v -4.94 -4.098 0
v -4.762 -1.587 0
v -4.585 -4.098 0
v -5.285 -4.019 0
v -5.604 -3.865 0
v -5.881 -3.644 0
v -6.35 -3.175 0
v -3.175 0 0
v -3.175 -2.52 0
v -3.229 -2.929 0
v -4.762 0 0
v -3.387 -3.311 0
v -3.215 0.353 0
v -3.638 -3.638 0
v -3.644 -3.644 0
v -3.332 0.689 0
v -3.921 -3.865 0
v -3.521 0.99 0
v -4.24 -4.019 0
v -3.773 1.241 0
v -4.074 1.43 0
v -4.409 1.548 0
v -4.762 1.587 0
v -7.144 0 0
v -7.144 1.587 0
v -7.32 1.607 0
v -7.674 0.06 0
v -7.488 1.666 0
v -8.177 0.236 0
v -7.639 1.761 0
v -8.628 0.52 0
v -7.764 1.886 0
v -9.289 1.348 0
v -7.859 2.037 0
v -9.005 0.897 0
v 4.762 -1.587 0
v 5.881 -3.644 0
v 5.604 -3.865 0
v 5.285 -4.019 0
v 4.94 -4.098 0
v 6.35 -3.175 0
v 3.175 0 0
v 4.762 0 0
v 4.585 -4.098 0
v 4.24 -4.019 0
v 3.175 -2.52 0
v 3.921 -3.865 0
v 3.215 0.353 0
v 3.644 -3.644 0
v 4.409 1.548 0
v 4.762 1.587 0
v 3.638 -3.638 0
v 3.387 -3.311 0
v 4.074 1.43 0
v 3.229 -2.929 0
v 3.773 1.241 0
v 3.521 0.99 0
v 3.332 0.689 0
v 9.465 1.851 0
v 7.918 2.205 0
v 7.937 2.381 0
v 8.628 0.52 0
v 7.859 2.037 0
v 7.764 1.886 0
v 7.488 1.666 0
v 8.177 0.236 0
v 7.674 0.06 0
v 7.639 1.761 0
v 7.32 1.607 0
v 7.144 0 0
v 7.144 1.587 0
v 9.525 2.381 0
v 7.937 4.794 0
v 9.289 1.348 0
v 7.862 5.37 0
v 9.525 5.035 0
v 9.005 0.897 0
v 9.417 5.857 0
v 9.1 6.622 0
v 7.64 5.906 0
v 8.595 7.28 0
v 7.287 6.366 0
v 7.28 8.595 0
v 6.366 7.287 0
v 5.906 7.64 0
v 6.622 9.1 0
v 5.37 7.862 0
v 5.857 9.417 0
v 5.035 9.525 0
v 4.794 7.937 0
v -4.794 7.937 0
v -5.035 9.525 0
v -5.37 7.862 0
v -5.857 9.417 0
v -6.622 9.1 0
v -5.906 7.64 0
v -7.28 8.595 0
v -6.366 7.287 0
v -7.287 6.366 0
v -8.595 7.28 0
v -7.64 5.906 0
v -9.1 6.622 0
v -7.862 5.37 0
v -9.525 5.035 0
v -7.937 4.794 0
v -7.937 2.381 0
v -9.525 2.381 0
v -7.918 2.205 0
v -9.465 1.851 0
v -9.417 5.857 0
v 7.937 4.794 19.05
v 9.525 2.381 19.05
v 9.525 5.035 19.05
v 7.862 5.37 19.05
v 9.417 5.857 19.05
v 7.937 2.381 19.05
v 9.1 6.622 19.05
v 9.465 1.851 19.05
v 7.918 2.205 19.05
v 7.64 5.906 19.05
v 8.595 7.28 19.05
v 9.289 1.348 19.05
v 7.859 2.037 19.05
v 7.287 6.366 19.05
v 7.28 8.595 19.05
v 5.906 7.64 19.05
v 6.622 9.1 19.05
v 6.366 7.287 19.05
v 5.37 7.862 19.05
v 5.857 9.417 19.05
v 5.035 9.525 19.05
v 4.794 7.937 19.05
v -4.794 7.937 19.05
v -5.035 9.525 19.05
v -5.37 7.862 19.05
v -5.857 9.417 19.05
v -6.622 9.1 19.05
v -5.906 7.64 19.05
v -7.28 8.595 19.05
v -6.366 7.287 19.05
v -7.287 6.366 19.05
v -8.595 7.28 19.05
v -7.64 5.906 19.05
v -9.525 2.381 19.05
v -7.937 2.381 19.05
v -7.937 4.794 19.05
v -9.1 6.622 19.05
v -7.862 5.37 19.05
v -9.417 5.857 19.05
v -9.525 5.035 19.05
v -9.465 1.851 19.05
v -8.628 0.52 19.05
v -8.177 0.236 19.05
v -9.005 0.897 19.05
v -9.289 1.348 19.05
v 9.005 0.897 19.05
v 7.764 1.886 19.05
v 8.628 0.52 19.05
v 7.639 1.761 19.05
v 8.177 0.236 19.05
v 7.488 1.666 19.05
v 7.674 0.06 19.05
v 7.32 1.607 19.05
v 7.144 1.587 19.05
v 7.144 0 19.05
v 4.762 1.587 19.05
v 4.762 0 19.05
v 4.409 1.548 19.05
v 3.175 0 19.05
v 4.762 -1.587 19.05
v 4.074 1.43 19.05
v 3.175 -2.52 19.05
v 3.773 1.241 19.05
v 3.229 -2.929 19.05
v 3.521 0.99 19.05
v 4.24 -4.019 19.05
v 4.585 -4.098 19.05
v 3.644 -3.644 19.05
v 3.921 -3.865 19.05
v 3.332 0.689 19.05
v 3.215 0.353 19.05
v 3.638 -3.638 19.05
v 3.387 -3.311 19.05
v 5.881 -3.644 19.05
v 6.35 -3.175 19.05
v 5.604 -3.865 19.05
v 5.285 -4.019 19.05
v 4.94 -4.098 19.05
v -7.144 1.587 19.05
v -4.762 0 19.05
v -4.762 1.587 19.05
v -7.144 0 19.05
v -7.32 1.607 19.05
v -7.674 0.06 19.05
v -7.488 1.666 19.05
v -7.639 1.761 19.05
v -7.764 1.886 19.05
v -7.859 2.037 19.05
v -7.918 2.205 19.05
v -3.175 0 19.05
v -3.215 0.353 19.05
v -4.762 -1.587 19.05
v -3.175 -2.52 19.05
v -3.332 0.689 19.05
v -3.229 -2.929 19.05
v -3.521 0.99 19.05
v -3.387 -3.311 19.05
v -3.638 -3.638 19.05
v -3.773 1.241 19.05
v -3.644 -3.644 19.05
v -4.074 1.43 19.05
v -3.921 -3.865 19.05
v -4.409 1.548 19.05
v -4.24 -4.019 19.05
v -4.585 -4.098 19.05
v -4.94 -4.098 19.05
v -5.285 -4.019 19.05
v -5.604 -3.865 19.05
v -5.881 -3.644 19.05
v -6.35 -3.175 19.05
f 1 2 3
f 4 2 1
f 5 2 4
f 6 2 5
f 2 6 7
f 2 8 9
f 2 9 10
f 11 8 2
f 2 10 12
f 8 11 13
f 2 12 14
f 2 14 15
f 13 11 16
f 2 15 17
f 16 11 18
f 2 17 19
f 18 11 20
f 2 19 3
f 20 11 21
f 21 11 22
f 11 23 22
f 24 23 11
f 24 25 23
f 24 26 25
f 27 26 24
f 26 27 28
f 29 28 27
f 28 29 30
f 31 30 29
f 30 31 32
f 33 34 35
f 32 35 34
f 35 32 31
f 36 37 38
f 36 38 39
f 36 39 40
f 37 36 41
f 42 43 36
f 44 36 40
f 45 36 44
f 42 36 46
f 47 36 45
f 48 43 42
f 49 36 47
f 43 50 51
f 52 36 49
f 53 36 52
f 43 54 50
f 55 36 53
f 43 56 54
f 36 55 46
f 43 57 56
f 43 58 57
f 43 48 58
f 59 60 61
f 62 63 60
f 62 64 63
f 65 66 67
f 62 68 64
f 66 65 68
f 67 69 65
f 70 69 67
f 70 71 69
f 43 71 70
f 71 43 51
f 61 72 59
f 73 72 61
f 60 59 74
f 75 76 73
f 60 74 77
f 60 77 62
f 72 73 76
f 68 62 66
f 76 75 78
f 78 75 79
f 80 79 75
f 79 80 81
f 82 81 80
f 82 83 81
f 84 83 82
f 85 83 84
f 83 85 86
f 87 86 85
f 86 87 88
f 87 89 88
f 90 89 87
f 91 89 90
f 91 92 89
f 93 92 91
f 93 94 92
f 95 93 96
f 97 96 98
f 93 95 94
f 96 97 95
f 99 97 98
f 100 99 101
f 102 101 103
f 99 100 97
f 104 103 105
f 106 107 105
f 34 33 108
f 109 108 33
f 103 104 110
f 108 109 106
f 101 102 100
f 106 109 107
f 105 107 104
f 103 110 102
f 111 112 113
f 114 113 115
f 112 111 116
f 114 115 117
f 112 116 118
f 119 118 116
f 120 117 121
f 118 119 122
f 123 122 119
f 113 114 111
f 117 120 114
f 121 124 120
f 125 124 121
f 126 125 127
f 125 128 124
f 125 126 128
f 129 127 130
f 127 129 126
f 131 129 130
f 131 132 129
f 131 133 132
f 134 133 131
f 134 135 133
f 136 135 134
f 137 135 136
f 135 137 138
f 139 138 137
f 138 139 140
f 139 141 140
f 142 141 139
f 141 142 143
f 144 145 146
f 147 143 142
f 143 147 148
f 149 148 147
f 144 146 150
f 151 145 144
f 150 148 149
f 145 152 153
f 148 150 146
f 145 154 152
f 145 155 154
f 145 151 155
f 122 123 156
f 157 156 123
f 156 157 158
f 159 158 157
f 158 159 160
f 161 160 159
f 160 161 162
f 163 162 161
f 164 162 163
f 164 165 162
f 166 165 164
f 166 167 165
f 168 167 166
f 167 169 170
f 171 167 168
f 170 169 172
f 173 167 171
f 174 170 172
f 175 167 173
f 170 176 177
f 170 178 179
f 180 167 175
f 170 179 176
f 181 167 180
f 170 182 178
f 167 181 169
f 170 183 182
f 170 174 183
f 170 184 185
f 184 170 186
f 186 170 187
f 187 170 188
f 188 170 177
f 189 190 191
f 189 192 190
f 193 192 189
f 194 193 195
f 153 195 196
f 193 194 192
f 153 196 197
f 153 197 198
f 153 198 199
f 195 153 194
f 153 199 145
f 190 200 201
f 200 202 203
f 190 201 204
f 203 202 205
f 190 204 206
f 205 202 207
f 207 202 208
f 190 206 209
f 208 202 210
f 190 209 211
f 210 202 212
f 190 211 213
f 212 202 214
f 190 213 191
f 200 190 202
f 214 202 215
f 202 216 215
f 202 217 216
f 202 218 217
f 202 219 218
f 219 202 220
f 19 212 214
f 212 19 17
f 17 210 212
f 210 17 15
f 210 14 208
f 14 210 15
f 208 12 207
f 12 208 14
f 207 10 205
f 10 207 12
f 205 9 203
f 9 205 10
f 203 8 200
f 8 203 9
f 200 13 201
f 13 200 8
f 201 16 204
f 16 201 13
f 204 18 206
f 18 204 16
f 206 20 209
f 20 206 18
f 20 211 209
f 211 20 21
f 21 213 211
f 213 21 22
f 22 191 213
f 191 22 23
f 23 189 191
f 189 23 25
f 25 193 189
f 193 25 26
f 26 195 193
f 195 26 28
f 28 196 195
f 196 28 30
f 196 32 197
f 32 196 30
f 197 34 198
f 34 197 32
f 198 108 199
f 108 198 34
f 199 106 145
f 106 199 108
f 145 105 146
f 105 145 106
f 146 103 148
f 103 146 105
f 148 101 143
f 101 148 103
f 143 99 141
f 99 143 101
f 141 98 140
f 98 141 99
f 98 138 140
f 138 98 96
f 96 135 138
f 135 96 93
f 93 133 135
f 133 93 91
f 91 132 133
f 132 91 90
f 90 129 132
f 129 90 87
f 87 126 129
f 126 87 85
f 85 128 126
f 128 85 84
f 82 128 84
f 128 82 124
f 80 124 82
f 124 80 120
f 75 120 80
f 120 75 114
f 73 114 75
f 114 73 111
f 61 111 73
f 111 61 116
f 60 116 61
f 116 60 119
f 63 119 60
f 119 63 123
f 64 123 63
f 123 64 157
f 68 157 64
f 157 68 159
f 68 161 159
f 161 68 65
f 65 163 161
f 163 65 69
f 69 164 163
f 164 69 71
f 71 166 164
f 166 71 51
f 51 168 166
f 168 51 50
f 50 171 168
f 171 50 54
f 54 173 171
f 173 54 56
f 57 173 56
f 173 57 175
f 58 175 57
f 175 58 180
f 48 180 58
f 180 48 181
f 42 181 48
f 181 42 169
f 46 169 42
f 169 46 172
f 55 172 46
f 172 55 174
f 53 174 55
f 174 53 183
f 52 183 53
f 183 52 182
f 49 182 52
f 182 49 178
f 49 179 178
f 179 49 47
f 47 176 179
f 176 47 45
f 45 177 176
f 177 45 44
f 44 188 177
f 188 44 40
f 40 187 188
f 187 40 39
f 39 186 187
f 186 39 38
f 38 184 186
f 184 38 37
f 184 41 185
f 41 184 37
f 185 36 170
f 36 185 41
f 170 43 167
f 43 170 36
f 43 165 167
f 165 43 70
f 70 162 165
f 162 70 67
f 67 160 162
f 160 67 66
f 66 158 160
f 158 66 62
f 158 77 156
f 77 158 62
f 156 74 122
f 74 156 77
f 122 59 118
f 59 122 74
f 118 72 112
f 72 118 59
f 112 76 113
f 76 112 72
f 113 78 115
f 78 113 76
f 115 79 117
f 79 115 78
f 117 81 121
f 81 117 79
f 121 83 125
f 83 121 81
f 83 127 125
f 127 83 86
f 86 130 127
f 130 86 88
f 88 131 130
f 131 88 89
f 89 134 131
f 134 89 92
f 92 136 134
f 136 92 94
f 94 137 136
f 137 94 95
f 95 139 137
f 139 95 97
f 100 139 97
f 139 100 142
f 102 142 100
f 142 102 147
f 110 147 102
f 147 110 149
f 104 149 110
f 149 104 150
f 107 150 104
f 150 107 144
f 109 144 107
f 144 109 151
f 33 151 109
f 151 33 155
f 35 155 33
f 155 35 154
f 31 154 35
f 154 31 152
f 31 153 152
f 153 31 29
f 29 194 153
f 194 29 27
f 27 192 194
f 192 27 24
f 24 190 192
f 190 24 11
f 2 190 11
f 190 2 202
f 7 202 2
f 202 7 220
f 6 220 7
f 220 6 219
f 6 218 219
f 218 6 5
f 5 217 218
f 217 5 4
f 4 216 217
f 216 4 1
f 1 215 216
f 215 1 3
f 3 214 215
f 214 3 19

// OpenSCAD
// file: ../lib/TOGArrayLib1.scad
// TOGArrayLib1.5
// 
// Functions for working with arrays.
// 
// v1.1:
// - tal1_reduce assert(is_list(items)) to prevent infinite recursion
//   when given undefined or other non-list values
// v1.1.1:
// - Fix tal1_uniq_remap_v2 to return "list-remap-result" as the
//   first element of the returned list
// v1.2:
// - Add tal1_replace_at function
// v1.3:
// - tal1_is_vec_of, tal1_is_vec_of_num
// v1.4:
// - tal1_assert_for_each, for when you want to assert something
//   about each of a list of items and get nice failure messages
// v1.5:
// - Add tal1_duplicate_reversed function, which may be
//   handy when generating symmetrical polygons and stuff.

/**
 * Make a list with the contents of list `a`,
 * but starting at offset `off`, replaced by the contents of list `b`.
 * len(result) = max(len(a), off+len(b))
 */
function tal1_replace_at(a, off, b, default_value=undef, default_value_function=undef) =
	assert(is_list(a))
	assert(is_list(b))
	let( _dvf = !is_undef(default_value_function) ? default_value_function : function(i) default_value )
[
	for( i=[0:1:min(off,len(a))-1] ) a[i],
	for( i=[len(a):1:off-1] ) _dvf(i),
	for( i=[off:1:off+len(b)-1] ) b[i-off],
	for( i=[off+len(b):1:len(a)-1] ) a[i],
];

// Simplest case
assert([] == tal1_replace_at([], 0, []));
// Second simplest cases
assert(["foo"] == tal1_replace_at(["foo"], 0, []));
assert(["foo"] == tal1_replace_at([], 0, ["foo"]));
// Replace one item
assert(["foo","quux","baz"] == tal1_replace_at(["foo","bar","baz"], 1, ["quux"]));
// Replace and extend
assert(["foo","quux","tuna","tina"] == tal1_replace_at(["foo","bar","baz"], 1, ["quux", "tuna", "tina"]));
// Add beyond end of `a`
assert(["foo","zzz","quux"] == tal1_replace_at(["foo"], 2, ["quux"], default_value="zzz"));
// Adding 'nothing' should still fill to that point with defaults
assert(["foo","zzz","zzz"] == tal1_replace_at(["foo"], 3, [], default_value="zzz"));


function tal1_reduce(start, items, func, offset=0) =
	assert(is_list(items))
	len(items) == offset ? start :
	tal1_reduce(func(start, items[offset]), items, func, offset+1);

function tal1_consecutive_duplicate_count(items) = tal1_reduce(
	[0, undef],
	items,
	function(z,item) [z[0] + (item == z[1] ? 1 : 0), item]
)[0];

assert(0 == tal1_consecutive_duplicate_count([]));
assert(0 == tal1_consecutive_duplicate_count([50]));
assert(1 == tal1_consecutive_duplicate_count([50,50]));
assert(0 == tal1_consecutive_duplicate_count([50,51,52,53]));
assert(1 == tal1_consecutive_duplicate_count([50,51,52,52]));
assert(3 == tal1_consecutive_duplicate_count([50,50,50,50]));

// Set test_size to arbirarily large values
// to ensure that OpenSCAD can handle heavy recursion
let(test_size=1000) assert(test_size/2 == tal1_consecutive_duplicate_count([for(i=[0:1:test_size-1]) floor(i/2)]));



function tal1_uniq_(items, off0, off1) =
	let(chunklen = off1-off0)
	chunklen == 0 ? [] :
	chunklen == 1 ? [items[off0]] :
	let(half=floor(chunklen/2))
	let(left  = tal1_uniq_(items, off0     , off0+half))
	let(right = tal1_uniq_(items, off0+half, off1     ))
	assert(len(left) > 0)
	assert(len(right) > 0)
	left[len(left)-1] == right[0] ? [each left, for(i=[1:1:len(right)-1]) right[i]] :
	[each left, each right];

/** Given a list of items, returns a new list with identical consecutive items merged */
function tal1_uniq(items) = tal1_uniq_(items, 0, len(items));

assert([] == tal1_uniq([]));
assert([123] == tal1_uniq([123]));
assert([55,0,1,2,3] == tal1_uniq([55,0,1,2,3]));
assert([55,0,1,2] == tal1_uniq([55,0,1,1,2]));
assert([55,0,1] == tal1_uniq([55,55,0,0,0,0,0,0,1,1,1,1]));
assert([55,0] == tal1_uniq([55,0,0,0,0,0,0,0]));



/**
 * Returns [new items, old index -> new index mapping].
 * No-op version.
 */
function tal1_uniq_remap_v1(items) =
	["list-remap-result", items, [for (vi=[0:1:len(items)-1]) vi]];

// [a, a, b, b, c, c]
//
// [a,    ...], []  -> [a],[0]
// [a, a, ...], [0] -> [a],[0,0]

assert([1,2,3] == [1,2,3]);

/**
 * Recursive version that will combine adjacent identical vertexes,
 * but will use the original items.
 */
function tal1_uniq_remap_v2(items, map=[]) =
	let(index = len(map))
	len(items) == index ? ["list-remap-result", items, map] :
	index == 0 ? tal1_uniq_remap_v2(items, [0]) :
	items[index] == items[map[index-1]] ? tal1_uniq_remap_v2(items, [for(vi=map) vi, map[index-1]]) :
	tal1_uniq_remap_v2(items, [for(vi=map) vi, index]);

assert(tal1_uniq_remap_v2([1,1,2,2,3,4]) == ["list-remap-result", [1,1,2,2,3,4], [0,0,2,2,4,5]]);


/**
 * Returns true if `vec` is a list of at least min_len items
 * and component_check(each item, even those beyond min_len) is true.
 */
function tal1_is_vec_of(vec, min_len=0, component_check=function(x) true) =
	assert(is_num(min_len) && min_len >= 0)
	assert(is_function(component_check))
	is_list(vec) && len(vec) >= min_len &&
	tal1_reduce(true, vec, function(prev,item) prev && component_check(item));

function tal1_is_vec_of_num(vec, min_len=0) = tal1_is_vec_of(vec, min_len, function(i) is_num(i));

assert( true == tal1_is_vec_of_num([1,2,3]));
assert( true == tal1_is_vec_of_num([]));
assert( true == tal1_is_vec_of_num([1,2,3], 3));
assert(false == tal1_is_vec_of_num([1,2], 3));
assert(false == tal1_is_vec_of_num([1,2,"spoon"], 3));
// Requirements are ambiguous when
// first min_len items are numbers, but there are non-numeric items afterwards,
// so let's error on the side of saying 'no, it's not a list of numbers';
// i.e. the item check and the min_len are independent.
assert(false == tal1_is_vec_of_num([1,2,3,"artichoke"], 3));


/**
 * Asserts that item_checker(each item in list, index of item)[0] is true.
 * Second element of item_checker return value is assertion message.
 * Returns the original list, in case that's useful to you.
 */
function tal1_assert_for_each(list, item_checker) =
	let( _ignored = [ for(i=[0:1:len(list)-1])
		let(q=item_checker(list[i],i))
		let(passed=is_bool(q) ? q : is_list(q) ? q[0] : assert(false, str(
			"tal1_assert_for_each: item_checker should return Bool|[Bool,String], but returned ",
			q, " for item at index ", i)))
		let(message=is_list(q) ? q[1] : undef)
		assert(passed, message)
		q
	])
	list;

// Callback can return a boolean...
assert([1,2,3] == tal1_assert_for_each([1,2,3], function(v,i) is_num(v)));
// ...or a [boolean, string]
assert([1,2,3] == tal1_assert_for_each([1,2,3], function(v,i) [is_num(v), "element be a num"]));

// [a, b, c] -> [a, b, c, rxf(c), rxf(b), rxf(a)]
function tal1_duplicate_reversed(list, rxf=function(item) item) =
	[
		each list,
		for( i=[len(list)-1 : -1 : 0] ) rxf(list[i]),
	];
// file: ../lib/TOGComplexLib1.scad
function tcplx1_multiply(a, b) =
	[a[0]*b[0] - a[1]*b[1], a[0]*b[1] + a[1]*b[0]];
function tcplx1_divide(a, b) =
	let(bot = (b[0]*b[0] + b[1]*b[1]))
	[
		(a[0]*b[0] + a[1]*b[1])/bot,
		(a[1]*b[0] - a[0]*b[1])/bot
	];

assert([-11,23] == tcplx1_multiply([3,2], [1,7]));

assert([-1,3] == tcplx1_multiply([3,1], [0,1]));
assert([-1,3] == tcplx1_multiply([0,1], [3,1]));

echo(tcplx1_divide([-1,3], [3,1]));
assert([0,1] == tcplx1_divide([-1,3], [3,1]));

function tcplx1_normalize(vec) =
	let(veclen = sqrt(vec[0]*vec[0]+vec[1]*vec[1]))
	[vec[0] / veclen, vec[1] / veclen];

function tcplx1_relative_turnvec_vv(v0, v1) =
	tcplx1_divide(tcplx1_normalize(v1), tcplx1_normalize(v0));

function tcplx1_relative_turnvec_abc(p0, p1, p2) = tcplx1_relative_turnvec_vv(p1-p0, p2-p1);

// A 90-degree turn
assert([0,1] == tcplx1_relative_turnvec_abc([0,0], [1,0], [1,1]));
assert([0,1] == tcplx1_relative_turnvec_abc([0,0], [0,1], [-1,1]));

// A 45-degree turn
assert(tcplx1_normalize([1,1]) == tcplx1_relative_turnvec_abc([0,0], [1,0], [ 2,1]));
assert(tcplx1_normalize([1,1]) == tcplx1_relative_turnvec_abc([0,0], [0,1], [-1,2]));


function tcplx1_relative_angle_abc(p0, p1, p2) =
	let(turnvec = tcplx1_relative_turnvec_abc(p0, p1, p2))
	atan2(turnvec[1], turnvec[0]);

assert(-135 == tcplx1_relative_angle_abc([0,0], [1,0], [0,-1]));
assert( -90 == tcplx1_relative_angle_abc([0,0], [1,0], [1,-1]));
assert(   0 == tcplx1_relative_angle_abc([0,0], [1,0], [2, 0]));
assert(  90 == tcplx1_relative_angle_abc([0,0], [1,0], [1, 1]));
assert( 135 == tcplx1_relative_angle_abc([0,0], [1,0], [0, 1]));

assert(  90 == tcplx1_relative_angle_abc([1,1], [3,3], [1, 5]));
// file: ../lib/TOGMod1Constructors.scad
// TOGMod1Constructors-v1.11
// 
// Functions to construct objects understood by TOGMod1
// 
// v1.1:
// - Add togmod1_make_rounded_rect
// v1.2:
// - togmod1_make_rounded_rect can make ovals
// v1.3:
// - togmod1_circle_points, to just get the points of a circle
// - if pos parameter to circle function has a third element,
//   returned vertexes will include it as the z component;
// v1.3.1
// - Some assertions
// v1.4:
// - Refactor togmod1_rounded_rect_points and togmod1_circle_points
//   to use togmod1__make_nd_vector_adder for adapting to whatever
//   `pos` parameter is.
// v1.5:
// - togmod_rounded_rect_points will not simplify completely rounded sides
//   (where length of side is exactly twice the rounding radius)
//   unless simplify_rounded_sides=true
//   - This makes it more useful for polyhedron generation,
//     where radius varies, but number of points must remain constant.
// v1.6:
// - togmod1_make_rect makes a simple rectangle
// - togmod1_make_rounded_rect will defer to togmod1_make_rect when r=0
// v1.7:
// - togmod1_make_circle will return empty shape (["union"]) when d=0
// v1.8:
// - Add togmod1_text
// v1.9:
// - togmod1_circle_points uses 3 as minimum circle point count instead of 6
// v1.10:
// - Fix togmod1_linear_extrude_y so that range corresponds to Y start/end and
//   polygon X,Y correspond to X,Z.  Previously it was rotated wrongly,
//   which would have gone unnoticed for symmetrical shapes centered at 0,0.
// v1.11:
// - Remove an 'echo'

use <./TOGArrayLib1.scad>

function togmod1__make_nd_vector_adder(origin=[0,0]) =
	let(origin_is_zero = tal1_reduce(true, origin, function(prev,item) prev && item == 0))
	origin_is_zero ? (function(vec) len(vec) >= len(origin) ? vec : tal1_replace_at(origin, 0, vec)) :
	function(vec) [
		for(i=[0:1:max(len(origin),len(vec))-1]) (len(vec) > i ? vec[i] : 0) + (len(origin) > i ? origin[i] : 0),
	];

assert([1,2,3] == togmod1__make_nd_vector_adder()([1,2,3]));
assert([1,2,3] == togmod1__make_nd_vector_adder([0,0,3])([1,2]));


function togmod1_make_cuboid(size) =
	assert(is_list(size))
	assert(len(size) >= 3)
	assert(is_num(size[0]))
	assert(is_num(size[1]))
	assert(is_num(size[2]))
	["polyhedron-vf", [
		[-size[0]/2, -size[1]/2, -size[2]/2],
		[+size[0]/2, -size[1]/2, -size[2]/2],
		[-size[0]/2, +size[1]/2, -size[2]/2],
		[+size[0]/2, +size[1]/2, -size[2]/2],
		[-size[0]/2, -size[1]/2, +size[2]/2],
		[+size[0]/2, -size[1]/2, +size[2]/2],
		[-size[0]/2, +size[1]/2, +size[2]/2],
		[+size[0]/2, +size[1]/2, +size[2]/2]
	], [
		[0,1,3,2],[0,4,5,1],[4,6,7,5],[3,7,6,2],[1,5,7,3],[6,4,0,2]
	]];

function togmod1_make_polygon(verts) =
	["polygon-vp", verts, [[for( i=[0:1:len(verts)-1] ) i%len(verts)]]];

function togmod1_rounded_rect_points(size, r, pos=[0,0], simplify_rounded_sides=false) =
	assert(is_list(size))
	assert(len(size) >= 2)
	let(radii = is_list(r) ? r : is_num(r) ? [r,r] : assert(false, "rounded_rect r(adius) should be list<num> or num"))
	let(rx = radii[0])
	let(ry = radii[1])
	assert(is_num(rx))
	assert(is_num(ry))
	assert(size[0] >= 2*rx, str("size[0] must be >= 2*r[0]; size[0] = ",size[0],", 2*r[0] = ",2*rx))
	assert(size[1] >= 2*ry, str("size[1] must be >= 2*r[1]; size[1] = ",size[1],", 2*r[1] = ",2*ry))
	let(quarterfn=max($fn/4, 1))
	let(qfnx = simplify_rounded_sides && size[0] == 2*rx ? quarterfn-1 : quarterfn)
	let(qfny = simplify_rounded_sides && size[1] == 2*ry ? quarterfn-1 : quarterfn)
	let(finalizepos = togmod1__make_nd_vector_adder(pos))
[
	for(a=[0 : 1 : qfnx]) let(ang=      a*90/quarterfn) finalizepos([ size[0]/2-rx + rx*cos(ang),  size[1]/2-ry + ry*sin(ang)]),
	for(a=[0 : 1 : qfny]) let(ang= 90 + a*90/quarterfn) finalizepos([-size[0]/2+rx + rx*cos(ang),  size[1]/2-ry + ry*sin(ang)]),
	for(a=[0 : 1 : qfnx]) let(ang=180 + a*90/quarterfn) finalizepos([-size[0]/2+rx + rx*cos(ang), -size[1]/2+ry + ry*sin(ang)]),
	for(a=[0 : 1 : qfny]) let(ang=270 + a*90/quarterfn) finalizepos([ size[0]/2-rx + rx*cos(ang), -size[1]/2+ry + ry*sin(ang)]),
];

function togmod1_make_rect(size) =
	togmod1_make_polygon([
		[-size[0]/2, -size[1]/2],
		[+size[0]/2, -size[1]/2],
		[+size[0]/2, +size[1]/2],
		[-size[0]/2, +size[1]/2],
	]);

function togmod1_make_rounded_rect(size, r) =
	r == 0 ? togmod1_make_rect(size) :
	togmod1_make_polygon(togmod1_rounded_rect_points(size,r,simplify_rounded_sides=true));

/**
 * Returns points for an approximation of a circle where points are at distance r from pos.
 * Can be used to make other regular polygons, but the faces will be less than that
 * distance from pos (do some trig if you want face distance, e.g. for a hex nut).
 */
function togmod1_circle_points(r, pos=[0,0], d=undef) =
	assert( !is_undef(r) || !is_undef(d) )
	assert(!is_undef(pos[0]))
	assert(!is_undef(pos[1]))
	let(finalizepos = togmod1__make_nd_vector_adder(pos))
	let(r_ = !is_undef(r) ? r : d/2)
	let(fn = max($fn, 3))
	[for(i=[0 : 1 : fn-1]) finalizepos([r_*cos(i*360/fn), r_*sin(i*360/fn)])];

function togmod1_make_circle(r, pos=[0,0], d=undef) =
	r == 0 || d == 0 ? ["union"] :
	togmod1_make_polygon(togmod1_circle_points(r=r, pos=pos, d=d));

function togmod1_make_cylinder(d, zrange=[0,1], r=undef, pos=[0,0]) =
	assert( !is_undef(r) || !is_undef(d) )
	let( r_ = !is_undef(r) ? r : d/2 )
	// TODO: Make polyhedron directly
	["linear-extrude-zs", zrange, togmod1_make_circle(r=r_, pos=pos)];

function togmod1__is_range1d(range) = is_list(range) && len(range) == 2 && is_num(range[0]) && is_num(range[1]);

function togmod1_linear_extrude_z(range, shape) =
	assert(togmod1__is_range1d(range))
	["linear-extrude-zs", range, shape];
function togmod1_linear_extrude_x(range, shape) =
	assert(togmod1__is_range1d(range))
	["rotate", [90, 0, 90], togmod1_linear_extrude_z(range, shape)];
function togmod1_linear_extrude_y(range, shape) =
	assert(togmod1__is_range1d(range))
	["rotate", [90, 0,  0], togmod1_linear_extrude_z([-range[1], -range[0]], shape)];

function togmod1_text(text, size, font, halign, valign, spacing, direction, language, script) =
	["text-tsfhvsdls", text, size, font, halign, valign, spacing, direction, language, script];
// file: ../lib/TOGMod1.scad
// TOGMod1.9
// OpenSCAD library for representing shapes
// 
// See also: Functional OpenSCAD (https://github.com/thehans/FunctionalOpenSCAD)
// 
// v1.8:
// - Add `text-tsfhvsdls`
// v1.9
// - Add `offset-ds` (offset with _d_elta a _s_hape)

module togmod1_domodule(mod) {
	assert(is_list(mod));
	assert(len(mod) > 0);
	if( mod[0] == "polygon-vp" ) {
		// ["polygon-vp", vertexes, paths]
		polygon(points=mod[1], paths=mod[2]);
	} else if( mod[0] == "polyhedron-vf" ) {
		polyhedron(mod[1], faces=mod[2]);
	} else if( mod[0] == "scale" ) {
		assert(len(mod) == 3);
		scale(mod[1]) togmod1_domodule(mod[2]);
	} else if( mod[0] == "translate" ) {
		assert(len(mod) == 3);
		assert(is_list(mod[1]));
		for(c=mod[1]) assert(is_num(c), "translate component should be numeric");
		translate(mod[1]) togmod1_domodule(mod[2]);
	} else if( mod[0] == "rotate" ) {
		assert(len(mod) == 3);
		rotate(mod[1]) togmod1_domodule(mod[2]);
	} else if( mod[0] == "intersection" ) {
		intersection_for( i=[1:1:len(mod)-1] ) togmod1_domodule(mod[i]);
	} else if( mod[0] == "difference" ) {
		difference() {
			togmod1_domodule(mod[1]);
			for( i=[2:1:len(mod)-1] ) togmod1_domodule(mod[i]);
		}
	} else if( mod[0] == "union" ) {
		for( i=[1:1:len(mod)-1] ) togmod1_domodule(mod[i]);
	} else if( mod[0] == "hull" ) {
		hull() for( i=[1:1:len(mod)-1] ) togmod1_domodule(mod[i]);
	} else if( mod[0] == "offset-rs" ) {
		assert(len(mod) == 3);
		assert(is_num(mod[1]));
		assert(is_list(mod[2]));
		offset(mod[1]) togmod1_domodule(mod[2]);
	} else if( mod[0] == "linear-extrude-zs" ) {
		// ["linear-extrude-zs", [z0,z1], 2d_shape] // centered
		// ["linear-extrude-zs", height, 2d_shape]
		let( zrange = is_list(mod[1]) ? mod[1] : [-mod[1]/2, mod[1]/2] ) {
			translate([0,0,zrange[0]]) linear_extrude(zrange[1]-zrange[0]) togmod1_domodule(mod[2]);
		}
	} else if( mod[0] == "render" ) {
		render() togmod1_domodule(mod[1]);
	} else if( mod[0] == "minkowski" ) {
		minkowski() {
			togmod1_domodule(mod[1]);
			togmod1_domodule(mod[2]);
		}
	} else if( mod[0] == "x-debug" ) {
		# togmod1_domodule(mod[1]);
	} else if( mod[0] == "x-color" ) {
		color(mod[1]) togmod1_domodule(mod[2]);
	} else if( mod[0] == "text-tsfhvsdls" ) {
		text(text=mod[1], size=mod[2], font=mod[3], halign=mod[4], valign=mod[5], spacing=mod[6], direction=mod[7], language=mod[7], script=mod[8]);
	} else if( mod[0] == "offset-ds" ) {
		assert(is_num(mod[1]));
		assert(is_list(mod[2]));
		offset(delta=mod[1]) togmod1_domodule(mod[2]);
	} else {
		assert(false, str("Unrecognized shape: ", mod[0]));
	}
}
// main file
// Clarp2508.0.9
// 
// Generalization of Clarp2505.
// Experimental class of shapes defined by offset (from 'top left
// corner of female block') and width of mating surface.
// 
// v0.1:
// - Define female shape
// v0.2:
// - Define male shape
// v0.3:
// - Adjustments to male shape to allow ms_x=1.5u to work
// v0.4:
// - Male shape avoids carving into flange when depth insufficient
// - Clarp2508-flangeless-male shape option
// v0.5:
// - Flangeless male can have zero 'depth'
// v0.6:
// - Options for straight holes
// v0.7:
// - Clarp2508-male2 shape, which should be better suited when depth <= 4u
// - Option for second set of holes
// v0.8:
// - Clarp2508-male3 shape, which is similar to male2 but avoiding
//   unprintable overhang when printed horizontally
// v0.9:
// - overhang_offset option; set to like -0.3
// 
// TODO: Parse ms_* params from a string, like Clarp2508:2.5u,2.5u,1u,
// so that it can be referenced by Clarp2507 or whatever.

part = "Clarp2508-male"; // ["Clarp2508-male","Clarp2508-male2","Clarp2508-male3","Clarp2508-female","Clarp2508-flangeless-male"]
ms_pos_u = [2.5, -1.5]; // 0.05
ms_width_u = 1; // 0.05
// Extend the overhang this far (mm); you probably want a small negative value less than 1/32
overhang_offset = 0; // [-1:0.1:1]
outer_width_u = 12;
outer_depth_u =  6;
thickness_u = 1.0; // 0.05
length_u = 12;
hole_spacing_u = 4;
hole_diameter = 0; // 0.1
hole2_spacing_u = 4;
hole2_diameter = 0; // 0.1
$fn = 32;

module clarp2508__end_params() { }

u = 254/160;

use <../lib/TOGMod1.scad>
use <../lib/TOGPath1.scad>
use <../lib/TOGMod1Constructors.scad>

function clarp2508__mirror_point(point) = [-point[0], point[1]];

function clarp2508__mirror_rathnode(node) = [
	node[0],
	clarp2508__mirror_point(node[1]),
	for(i=[2:1:len(node)-1]) node[i]
];

function clarp2508__reverse_list(list) = [
	for(i=[len(list)-1:-1:0]) list[i]
];

function clarp2508__mirror_rathnodes(nodes, translation=0) = [
	each                         [for(n=nodes)                            n ] ,
	each clarp2508__reverse_list([for(n=nodes) clarp2508__mirror_rathnode(n)]),
];

/*
 * ms_pos - [x, y] of center of ideal mating surface
 * ms_width - width along x or y axis of ideal mating surface
 * foo - female overhang offset; how 'extra far' the overhang should be
 *       (you probably want this to be negative)
 * moo - male overhang offset
 *
 * To give extra space for female parts, give a negative foo.
 * To give extra space for malke parts, give a negative moo.
 * Leave the non-applicable one alone.
 */
function clarp2508_ms_points(ms_pos, ms_width, x0, foo=0, moo=0) = [
	[x0 + ms_pos[0] - ms_width/2 - moo, ms_pos[1] - ms_width/2 - moo],
	[x0 + ms_pos[0] + ms_width/2 + foo, ms_pos[1] + ms_width/2 + foo],
];

function clarp2508_make_f_rath(
	ms_pos, ms_width, outer_width, outer_depth, thickness=1*u,
	top_inner_bevel=0.5*u, outer_bevel=2*u,
	overhang_offset=0 // TODO: 0 by default
) =
	// TODO: Some assertions about minimum width, depth
	let(x0 = -outer_width/2)
	let(y0 = -outer_depth)
	let(ms_points = clarp2508_ms_points(ms_pos, ms_width, x0, foo=overhang_offset))
	let(ms_point_a = ms_points[0])
	let(ms_point_z = ms_points[len(ms_points)-1])
	let(ib_y1 = y0+outer_bevel+thickness/2) // Top of inner bevel
	let(sl_y0 = max(ib_y1+0.1, ms_point_a[1]-(ms_point_a[0]-(x0+thickness)))) // bottom of sublip underside
	let(sl_r0 = 2*min(sl_y0-ib_y1, ms_point_a[1]-sl_y0)) // rounding radius of bottom of sublip underside
	["togpath1-rath", each clarp2508__mirror_rathnodes([
		["togpath1-rathnode", [x0+thickness+outer_bevel-thickness/2, y0+thickness], ["round", outer_bevel-thickness]],
		["togpath1-rathnode", [x0+thickness, ib_y1], ["round", outer_bevel-thickness]], // TODO: min(bevel, something) when depth is low
		["togpath1-rathnode", [x0+thickness, sl_y0], if(sl_r0 > 0) ["round", sl_r0]],
		each [for(p=ms_points) ["togpath1-rathnode", p]],
		["togpath1-rathnode", [ms_point_z[0],    0  ], ["bevel", top_inner_bevel]],
		["togpath1-rathnode", [       x0    ,    0  ]],
		["togpath1-rathnode", [       x0    , y0+outer_bevel], ["round", outer_bevel]],
		["togpath1-rathnode", [       x0+outer_bevel, y0    ], ["round", outer_bevel]],
	])];

function clarp2508_make_flangeless_m_rath(
	ms_pos, ms_width, outer_width, outer_depth, thickness=1*u,
	top_inner_bevel=0.5*u, outer_bevel=2*u,
	overhang_offset=0
) =
	let(x0 = -outer_width/2)
	let(y1 =  outer_depth)
	let(ms_points = clarp2508_ms_points(ms_pos, ms_width, x0, moo=overhang_offset))
	let(ms_point_a = ms_points[0])
	let(ms_point_z = ms_points[len(ms_points)-1])
	let(r0 = min(ms_width, thickness)*160/256)
	let(yf = outer_depth-thickness)
	let(yw = ms_point_a[1]-ms_width+thickness) // edge of wall
	["togpath1-rath", each clarp2508__mirror_rathnodes([
		
		["togpath1-rathnode", [ms_point_z[0]+thickness, yf], ["round", min(thickness, (yf-yw)*0.5)]],
		//["togpath1-rathnode", [ms_point_z[0]+thickness, yw], ["round", min(r0, (yf-yw)*0.5)]],
		["togpath1-rathnode", [ms_point_z[0]+thickness, ms_point_a[1]-ms_width], ["round", r0]],
		["togpath1-rathnode", [ms_point_a[0]+ms_width , ms_point_a[1]-ms_width], ["round", r0]],
		each [for(p=ms_points) ["togpath1-rathnode", p]],
		["togpath1-rathnode", [ms_point_z[0],    y1  ], ["round", min(thickness*2, 2*u)]],
	])];

function clarp2508_make_m_rath(
	ms_pos, ms_width, outer_width, outer_depth, thickness=1*u,
	top_inner_bevel=0.5*u, outer_bevel=2*u,
	overhang_offset=0
) =
	let(x0 = -outer_width/2)
	let(y1 =  outer_depth)
	let(ms_points = clarp2508_ms_points(ms_pos, ms_width, x0, moo=overhang_offset))
	let(ms_point_a = ms_points[0])
	let(ms_point_z = ms_points[len(ms_points)-1])
	let(r0 = min(ms_width, thickness)*255/256)
	let(r1 = min(outer_depth, thickness*1.5, ms_pos[0]+ms_width/2))
	let(flange_inner_depth = outer_depth - thickness*2 )
	let(_outer_bevel = max(0,min(outer_bevel, (outer_depth-r1)*0.6)))
	let(ib = let(b=_outer_bevel-thickness*0.6) b + 2*thickness > outer_depth ? 0 : b)
	assert(outer_depth > 0, str("Too short for this shape; maybe use flangeless-male, instead"))
	["togpath1-rath", each clarp2508__mirror_rathnodes([
		each flange_inner_depth > 0 ? [
			["togpath1-rathnode", [x0+thickness, y1-thickness], if(ib > 0) ["bevel", ib], if(ib > 0)["round", ib]],
			["togpath1-rathnode", [x0+thickness, thickness], ["round", max(0, r1-thickness)]],
			["togpath1-rathnode", [ms_point_z[0]+thickness, thickness], ["round", thickness]],
		] : [
			["togpath1-rathnode", [ms_point_z[0]+thickness, y1-thickness], ["round", thickness]],
		],
		["togpath1-rathnode", [ms_point_z[0]+thickness, ms_point_a[1]-ms_width+thickness], ["round", r0]],
	   ["togpath1-rathnode", [ms_point_a[0]+ms_width, ms_point_a[1]-ms_width], ["round", r0]],
		each [for(p=ms_points) ["togpath1-rathnode", p]],
		["togpath1-rathnode", [ms_point_z[0],    0  ], /*["bevel", top_inner_bevel]*/],
		["togpath1-rathnode", [       x0    ,    0  ], ["round", r1]],
		["togpath1-rathnode", [       x0    ,   y1  ], if(_outer_bevel>0)["bevel", _outer_bevel], if(_outer_bevel>0)["round", _outer_bevel]],
	])];

function clarp2508_make_m2_rath(
	ms_pos, ms_width, outer_width, outer_depth, thickness=1*u,
	outer_bevel=2*u,
	overhang_offset=0
) =
	assert( outer_depth >= thickness*2 )
	let(x0 = -outer_width/2)
	let(x1 = -outer_width/2 + outer_bevel)
	let(y0 =  0          )
	let(y1 =  outer_depth)
	let(ms_points = clarp2508_ms_points(ms_pos, ms_width, x0))
	let(ms_point_a = ms_points[0])
	let(ms_point_z = ms_points[len(ms_points)-1])
	let(r0 = min(ms_width, thickness)*255/256)
	let(iy0 = y0 + thickness, iy1 = y1 - thickness)
	let(inner_ydiff = iy1 - iy0)
	let(inner_bevel = min(outer_bevel*0.6, (iy1-iy0)/2))
	assert(outer_depth > 0, str("Too short for this shape; maybe use flangeless-male, instead"))
	["togpath1-rath", each clarp2508__mirror_rathnodes([
		// Inner elbow:
		["togpath1-rathnode", [x1+thickness*0.4, y1-thickness]],
		each (inner_ydiff - inner_bevel*2 > 0) ? [
			["togpath1-rathnode", [x1+thickness*0.4 - inner_bevel, iy1 - inner_bevel]],
			["togpath1-rathnode", [x1+thickness*0.4 - inner_bevel, iy0 + inner_bevel]],
		] : [
			["togpath1-rathnode", [x1+thickness*0.4 - inner_bevel, iy1 - inner_bevel]],
		],
		["togpath1-rathnode", [x1+thickness*0.4, y0+thickness]],
		// Inner clip:
		["togpath1-rathnode", [ms_point_z[0]+thickness, thickness], ["round", thickness]],
		["togpath1-rathnode", [ms_point_z[0]+thickness, ms_point_a[1]-ms_width+thickness], ["round", r0]],
	   ["togpath1-rathnode", [ms_point_a[0]+ms_width, ms_point_a[1]-ms_width], ["round", r0]],
		// Outer clip:
		each [for(p=ms_points) ["togpath1-rathnode", p]],
		["togpath1-rathnode", [ms_point_z[0],    0  ]],
		// Outer elbow:
		["togpath1-rathnode", [       x1,    0  ], ["round", outer_bevel/2]],
		each y0+outer_bevel < y1-outer_bevel ? [
			["togpath1-rathnode", [       x0    ,  y0+outer_bevel  ], ["round", outer_bevel/2]],
			["togpath1-rathnode", [       x0    ,  y1-outer_bevel  ], ["round", outer_bevel/2]],
		] : [
			["togpath1-rathnode", [       x0    ,  y0+outer_bevel  ], ["round", outer_bevel/2]],
		],
		["togpath1-rathnode", [       x1,   y1  ], ["round", outer_bevel/2]],
	])];

function clarp2508_make_m3_rath(
	ms_pos, ms_width, outer_width, outer_depth, thickness=1*u,
	outer_bevel=2*u,
	overhang_offset=0
) =
	assert( outer_depth >= thickness*2 )
	let(x0 = -outer_width/2)
	let(x1 = -outer_width/2 + outer_bevel)
	let(y0 =  0          )
	let(y1 =  outer_depth)
	let(ms_points = clarp2508_ms_points(ms_pos, ms_width, x0, moo=overhang_offset))
	let(ms_point_a = ms_points[0])
	let(ms_point_z = ms_points[len(ms_points)-1])
	let(r0 = min(ms_width, thickness)*255/256)
	let(iy0 = thickness*0.5, iy1 = y1 - thickness)
	let(inner_ydiff = iy1 - iy0)
	let(inner_bevel1 = min(ms_point_z[0]-x0, ms_point_z[0]-x0, inner_ydiff))
	let(inner_bevel2 = min(inner_ydiff - inner_bevel1, outer_bevel-1.3))
	assert(outer_depth > 0, str("Too short for this shape; maybe use flangeless-male, instead"))
	["togpath1-rath", each clarp2508__mirror_rathnodes([
		// Inner elbow:
		each inner_ydiff > inner_bevel1 ? [
			["togpath1-rathnode", [ms_point_z[0]-inner_bevel1+thickness + inner_bevel2, iy1             ]],
			["togpath1-rathnode", [ms_point_z[0]-inner_bevel1+thickness               , iy1-inner_bevel2]],
			["togpath1-rathnode", [ms_point_z[0]-inner_bevel1+thickness, thickness*0.4+inner_bevel1]],
		] : [
			["togpath1-rathnode", [ms_point_z[0]-inner_bevel1+thickness, thickness*0.4+inner_bevel1], ["round", min(0.5*u, inner_bevel1)]],
		],
		["togpath1-rathnode", [ms_point_z[0]             +thickness, thickness*0.4], ["round", min(1*u, inner_bevel1)]],
		// Inner clip:
		["togpath1-rathnode", [ms_point_z[0]+thickness, ms_point_a[1]-ms_width+thickness], ["round", r0]],
	   ["togpath1-rathnode", [ms_point_a[0]+ms_width, ms_point_a[1]-ms_width], ["round", r0]],
		// Outer clip:
		each [for(p=ms_points) ["togpath1-rathnode", p]],
		["togpath1-rathnode", [ms_point_z[0],    0  ]],
		// Outer elbow:
		["togpath1-rathnode", [       x1,    0  ], ["round", outer_bevel/2]],
		each y0+outer_bevel < y1-outer_bevel ? [
			["togpath1-rathnode", [       x0    ,  y0+outer_bevel  ], ["round", outer_bevel/2]],
			["togpath1-rathnode", [       x0    ,  y1-outer_bevel  ], ["round", outer_bevel/2]],
		] : [
			["togpath1-rathnode", [       x0    ,  y0+outer_bevel  ], ["round", outer_bevel/2]],
		],
		["togpath1-rathnode", [       x1,   y1  ], ["round", outer_bevel/2]],
	])];

// When this graduates from 'experimental',
// this could be part of Clarp2505, and use clgeneric
function clarp2508_rath_to_part(rath, holespecs) =
	["difference",
		togmod1_linear_extrude_z([0, length_u*u], togpath1_rath_to_polygon(rath)),
		
	 	for( h=holespecs ) let(hole=h[0], hole_spacing_u=h[1]) for( zm=[1/2 : 1 : length_u/hole_spacing_u] ) ["translate", [0,0,zm*hole_spacing_u*u], hole],
	];

function mkhole(hole_diameter) =
	hole_diameter > 0 ? ["rotate", [90,0,0], togmod1_linear_extrude_z([-outer_depth_u*u*2-100, outer_depth_u*u*2+100], togmod1_make_circle(d=hole_diameter))] :
	["union"];

togmod1_domodule(
	let( hole  = mkhole( hole_diameter) )
	let( hole2 = mkhole(hole2_diameter) )
	let( rath =
		part == "Clarp2508-flangeless-male" ? clarp2508_make_flangeless_m_rath(
			ms_pos_u*u, ms_width_u*u, outer_width_u*u, outer_depth_u*u, thickness=thickness_u*u) :
		part == "Clarp2508-male" ? clarp2508_make_m_rath(
		   ms_pos_u*u, ms_width_u*u, outer_width_u*u, outer_depth_u*u,
			thickness=thickness_u*u, overhang_offset=overhang_offset
		) :
		part == "Clarp2508-male2" ? clarp2508_make_m2_rath(
		   ms_pos_u*u, ms_width_u*u, outer_width_u*u, outer_depth_u*u,
			thickness=thickness_u*u, overhang_offset=overhang_offset
		) :
		part == "Clarp2508-male3" ? clarp2508_make_m3_rath(
		   ms_pos_u*u, ms_width_u*u, outer_width_u*u, outer_depth_u*u,
			thickness=thickness_u*u, overhang_offset=overhang_offset
		) :
		part == "Clarp2508-female" ? clarp2508_make_f_rath(
			ms_pos_u*u, ms_width_u*u, outer_width_u*u, outer_depth_u*u,
			thickness=thickness_u*u, overhang_offset=overhang_offset
		) :
		assert(false, str("Unknown part: '", part, "'"))
	)
	clarp2508_rath_to_part(rath, holespecs=[[hole, hole_spacing_u], [hole2, hole2_spacing_u]])
);
